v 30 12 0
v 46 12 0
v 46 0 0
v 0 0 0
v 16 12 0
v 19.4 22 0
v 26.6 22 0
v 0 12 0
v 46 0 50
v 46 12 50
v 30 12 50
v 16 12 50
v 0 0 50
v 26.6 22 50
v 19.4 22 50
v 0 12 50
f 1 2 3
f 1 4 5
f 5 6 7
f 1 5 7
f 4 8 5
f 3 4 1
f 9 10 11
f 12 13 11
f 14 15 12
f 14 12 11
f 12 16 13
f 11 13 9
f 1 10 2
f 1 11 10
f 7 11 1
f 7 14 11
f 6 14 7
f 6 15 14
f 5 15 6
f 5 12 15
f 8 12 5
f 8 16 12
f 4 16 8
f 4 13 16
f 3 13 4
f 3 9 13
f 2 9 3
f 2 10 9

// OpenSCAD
$fn = 32;

// ----------------------------------------------------------------------
// V guide rail: dovetail, 46 mm wide
// ----------------------------------------------------------------------

// --- parameters (mm) ---
rail_w = 46;              // rail width, X
base_t = 12;              // base plate thickness
v_depth = 10;             // V feature depth / height
v_half_w = 7;             // half width of the V at the base face
plate_t = 50;             // rail length, Z (the extrusion height)
top_half_w = 3.6;         // half width at the dovetail top

dovetail_base = 2 * v_half_w;  // dovetail width at the base
dovetail_top = 2 * top_half_w;  // dovetail width at the top

profile = [[0, 0], [46, 0], [46, 12], [30, 12], [26.6, 22], [19.4, 22], [16, 12], [0, 12]];  // primary outline, 8 points, counter clockwise

// --- the one profile operation ---
linear_extrude(height = plate_t) polygon(points = profile);
